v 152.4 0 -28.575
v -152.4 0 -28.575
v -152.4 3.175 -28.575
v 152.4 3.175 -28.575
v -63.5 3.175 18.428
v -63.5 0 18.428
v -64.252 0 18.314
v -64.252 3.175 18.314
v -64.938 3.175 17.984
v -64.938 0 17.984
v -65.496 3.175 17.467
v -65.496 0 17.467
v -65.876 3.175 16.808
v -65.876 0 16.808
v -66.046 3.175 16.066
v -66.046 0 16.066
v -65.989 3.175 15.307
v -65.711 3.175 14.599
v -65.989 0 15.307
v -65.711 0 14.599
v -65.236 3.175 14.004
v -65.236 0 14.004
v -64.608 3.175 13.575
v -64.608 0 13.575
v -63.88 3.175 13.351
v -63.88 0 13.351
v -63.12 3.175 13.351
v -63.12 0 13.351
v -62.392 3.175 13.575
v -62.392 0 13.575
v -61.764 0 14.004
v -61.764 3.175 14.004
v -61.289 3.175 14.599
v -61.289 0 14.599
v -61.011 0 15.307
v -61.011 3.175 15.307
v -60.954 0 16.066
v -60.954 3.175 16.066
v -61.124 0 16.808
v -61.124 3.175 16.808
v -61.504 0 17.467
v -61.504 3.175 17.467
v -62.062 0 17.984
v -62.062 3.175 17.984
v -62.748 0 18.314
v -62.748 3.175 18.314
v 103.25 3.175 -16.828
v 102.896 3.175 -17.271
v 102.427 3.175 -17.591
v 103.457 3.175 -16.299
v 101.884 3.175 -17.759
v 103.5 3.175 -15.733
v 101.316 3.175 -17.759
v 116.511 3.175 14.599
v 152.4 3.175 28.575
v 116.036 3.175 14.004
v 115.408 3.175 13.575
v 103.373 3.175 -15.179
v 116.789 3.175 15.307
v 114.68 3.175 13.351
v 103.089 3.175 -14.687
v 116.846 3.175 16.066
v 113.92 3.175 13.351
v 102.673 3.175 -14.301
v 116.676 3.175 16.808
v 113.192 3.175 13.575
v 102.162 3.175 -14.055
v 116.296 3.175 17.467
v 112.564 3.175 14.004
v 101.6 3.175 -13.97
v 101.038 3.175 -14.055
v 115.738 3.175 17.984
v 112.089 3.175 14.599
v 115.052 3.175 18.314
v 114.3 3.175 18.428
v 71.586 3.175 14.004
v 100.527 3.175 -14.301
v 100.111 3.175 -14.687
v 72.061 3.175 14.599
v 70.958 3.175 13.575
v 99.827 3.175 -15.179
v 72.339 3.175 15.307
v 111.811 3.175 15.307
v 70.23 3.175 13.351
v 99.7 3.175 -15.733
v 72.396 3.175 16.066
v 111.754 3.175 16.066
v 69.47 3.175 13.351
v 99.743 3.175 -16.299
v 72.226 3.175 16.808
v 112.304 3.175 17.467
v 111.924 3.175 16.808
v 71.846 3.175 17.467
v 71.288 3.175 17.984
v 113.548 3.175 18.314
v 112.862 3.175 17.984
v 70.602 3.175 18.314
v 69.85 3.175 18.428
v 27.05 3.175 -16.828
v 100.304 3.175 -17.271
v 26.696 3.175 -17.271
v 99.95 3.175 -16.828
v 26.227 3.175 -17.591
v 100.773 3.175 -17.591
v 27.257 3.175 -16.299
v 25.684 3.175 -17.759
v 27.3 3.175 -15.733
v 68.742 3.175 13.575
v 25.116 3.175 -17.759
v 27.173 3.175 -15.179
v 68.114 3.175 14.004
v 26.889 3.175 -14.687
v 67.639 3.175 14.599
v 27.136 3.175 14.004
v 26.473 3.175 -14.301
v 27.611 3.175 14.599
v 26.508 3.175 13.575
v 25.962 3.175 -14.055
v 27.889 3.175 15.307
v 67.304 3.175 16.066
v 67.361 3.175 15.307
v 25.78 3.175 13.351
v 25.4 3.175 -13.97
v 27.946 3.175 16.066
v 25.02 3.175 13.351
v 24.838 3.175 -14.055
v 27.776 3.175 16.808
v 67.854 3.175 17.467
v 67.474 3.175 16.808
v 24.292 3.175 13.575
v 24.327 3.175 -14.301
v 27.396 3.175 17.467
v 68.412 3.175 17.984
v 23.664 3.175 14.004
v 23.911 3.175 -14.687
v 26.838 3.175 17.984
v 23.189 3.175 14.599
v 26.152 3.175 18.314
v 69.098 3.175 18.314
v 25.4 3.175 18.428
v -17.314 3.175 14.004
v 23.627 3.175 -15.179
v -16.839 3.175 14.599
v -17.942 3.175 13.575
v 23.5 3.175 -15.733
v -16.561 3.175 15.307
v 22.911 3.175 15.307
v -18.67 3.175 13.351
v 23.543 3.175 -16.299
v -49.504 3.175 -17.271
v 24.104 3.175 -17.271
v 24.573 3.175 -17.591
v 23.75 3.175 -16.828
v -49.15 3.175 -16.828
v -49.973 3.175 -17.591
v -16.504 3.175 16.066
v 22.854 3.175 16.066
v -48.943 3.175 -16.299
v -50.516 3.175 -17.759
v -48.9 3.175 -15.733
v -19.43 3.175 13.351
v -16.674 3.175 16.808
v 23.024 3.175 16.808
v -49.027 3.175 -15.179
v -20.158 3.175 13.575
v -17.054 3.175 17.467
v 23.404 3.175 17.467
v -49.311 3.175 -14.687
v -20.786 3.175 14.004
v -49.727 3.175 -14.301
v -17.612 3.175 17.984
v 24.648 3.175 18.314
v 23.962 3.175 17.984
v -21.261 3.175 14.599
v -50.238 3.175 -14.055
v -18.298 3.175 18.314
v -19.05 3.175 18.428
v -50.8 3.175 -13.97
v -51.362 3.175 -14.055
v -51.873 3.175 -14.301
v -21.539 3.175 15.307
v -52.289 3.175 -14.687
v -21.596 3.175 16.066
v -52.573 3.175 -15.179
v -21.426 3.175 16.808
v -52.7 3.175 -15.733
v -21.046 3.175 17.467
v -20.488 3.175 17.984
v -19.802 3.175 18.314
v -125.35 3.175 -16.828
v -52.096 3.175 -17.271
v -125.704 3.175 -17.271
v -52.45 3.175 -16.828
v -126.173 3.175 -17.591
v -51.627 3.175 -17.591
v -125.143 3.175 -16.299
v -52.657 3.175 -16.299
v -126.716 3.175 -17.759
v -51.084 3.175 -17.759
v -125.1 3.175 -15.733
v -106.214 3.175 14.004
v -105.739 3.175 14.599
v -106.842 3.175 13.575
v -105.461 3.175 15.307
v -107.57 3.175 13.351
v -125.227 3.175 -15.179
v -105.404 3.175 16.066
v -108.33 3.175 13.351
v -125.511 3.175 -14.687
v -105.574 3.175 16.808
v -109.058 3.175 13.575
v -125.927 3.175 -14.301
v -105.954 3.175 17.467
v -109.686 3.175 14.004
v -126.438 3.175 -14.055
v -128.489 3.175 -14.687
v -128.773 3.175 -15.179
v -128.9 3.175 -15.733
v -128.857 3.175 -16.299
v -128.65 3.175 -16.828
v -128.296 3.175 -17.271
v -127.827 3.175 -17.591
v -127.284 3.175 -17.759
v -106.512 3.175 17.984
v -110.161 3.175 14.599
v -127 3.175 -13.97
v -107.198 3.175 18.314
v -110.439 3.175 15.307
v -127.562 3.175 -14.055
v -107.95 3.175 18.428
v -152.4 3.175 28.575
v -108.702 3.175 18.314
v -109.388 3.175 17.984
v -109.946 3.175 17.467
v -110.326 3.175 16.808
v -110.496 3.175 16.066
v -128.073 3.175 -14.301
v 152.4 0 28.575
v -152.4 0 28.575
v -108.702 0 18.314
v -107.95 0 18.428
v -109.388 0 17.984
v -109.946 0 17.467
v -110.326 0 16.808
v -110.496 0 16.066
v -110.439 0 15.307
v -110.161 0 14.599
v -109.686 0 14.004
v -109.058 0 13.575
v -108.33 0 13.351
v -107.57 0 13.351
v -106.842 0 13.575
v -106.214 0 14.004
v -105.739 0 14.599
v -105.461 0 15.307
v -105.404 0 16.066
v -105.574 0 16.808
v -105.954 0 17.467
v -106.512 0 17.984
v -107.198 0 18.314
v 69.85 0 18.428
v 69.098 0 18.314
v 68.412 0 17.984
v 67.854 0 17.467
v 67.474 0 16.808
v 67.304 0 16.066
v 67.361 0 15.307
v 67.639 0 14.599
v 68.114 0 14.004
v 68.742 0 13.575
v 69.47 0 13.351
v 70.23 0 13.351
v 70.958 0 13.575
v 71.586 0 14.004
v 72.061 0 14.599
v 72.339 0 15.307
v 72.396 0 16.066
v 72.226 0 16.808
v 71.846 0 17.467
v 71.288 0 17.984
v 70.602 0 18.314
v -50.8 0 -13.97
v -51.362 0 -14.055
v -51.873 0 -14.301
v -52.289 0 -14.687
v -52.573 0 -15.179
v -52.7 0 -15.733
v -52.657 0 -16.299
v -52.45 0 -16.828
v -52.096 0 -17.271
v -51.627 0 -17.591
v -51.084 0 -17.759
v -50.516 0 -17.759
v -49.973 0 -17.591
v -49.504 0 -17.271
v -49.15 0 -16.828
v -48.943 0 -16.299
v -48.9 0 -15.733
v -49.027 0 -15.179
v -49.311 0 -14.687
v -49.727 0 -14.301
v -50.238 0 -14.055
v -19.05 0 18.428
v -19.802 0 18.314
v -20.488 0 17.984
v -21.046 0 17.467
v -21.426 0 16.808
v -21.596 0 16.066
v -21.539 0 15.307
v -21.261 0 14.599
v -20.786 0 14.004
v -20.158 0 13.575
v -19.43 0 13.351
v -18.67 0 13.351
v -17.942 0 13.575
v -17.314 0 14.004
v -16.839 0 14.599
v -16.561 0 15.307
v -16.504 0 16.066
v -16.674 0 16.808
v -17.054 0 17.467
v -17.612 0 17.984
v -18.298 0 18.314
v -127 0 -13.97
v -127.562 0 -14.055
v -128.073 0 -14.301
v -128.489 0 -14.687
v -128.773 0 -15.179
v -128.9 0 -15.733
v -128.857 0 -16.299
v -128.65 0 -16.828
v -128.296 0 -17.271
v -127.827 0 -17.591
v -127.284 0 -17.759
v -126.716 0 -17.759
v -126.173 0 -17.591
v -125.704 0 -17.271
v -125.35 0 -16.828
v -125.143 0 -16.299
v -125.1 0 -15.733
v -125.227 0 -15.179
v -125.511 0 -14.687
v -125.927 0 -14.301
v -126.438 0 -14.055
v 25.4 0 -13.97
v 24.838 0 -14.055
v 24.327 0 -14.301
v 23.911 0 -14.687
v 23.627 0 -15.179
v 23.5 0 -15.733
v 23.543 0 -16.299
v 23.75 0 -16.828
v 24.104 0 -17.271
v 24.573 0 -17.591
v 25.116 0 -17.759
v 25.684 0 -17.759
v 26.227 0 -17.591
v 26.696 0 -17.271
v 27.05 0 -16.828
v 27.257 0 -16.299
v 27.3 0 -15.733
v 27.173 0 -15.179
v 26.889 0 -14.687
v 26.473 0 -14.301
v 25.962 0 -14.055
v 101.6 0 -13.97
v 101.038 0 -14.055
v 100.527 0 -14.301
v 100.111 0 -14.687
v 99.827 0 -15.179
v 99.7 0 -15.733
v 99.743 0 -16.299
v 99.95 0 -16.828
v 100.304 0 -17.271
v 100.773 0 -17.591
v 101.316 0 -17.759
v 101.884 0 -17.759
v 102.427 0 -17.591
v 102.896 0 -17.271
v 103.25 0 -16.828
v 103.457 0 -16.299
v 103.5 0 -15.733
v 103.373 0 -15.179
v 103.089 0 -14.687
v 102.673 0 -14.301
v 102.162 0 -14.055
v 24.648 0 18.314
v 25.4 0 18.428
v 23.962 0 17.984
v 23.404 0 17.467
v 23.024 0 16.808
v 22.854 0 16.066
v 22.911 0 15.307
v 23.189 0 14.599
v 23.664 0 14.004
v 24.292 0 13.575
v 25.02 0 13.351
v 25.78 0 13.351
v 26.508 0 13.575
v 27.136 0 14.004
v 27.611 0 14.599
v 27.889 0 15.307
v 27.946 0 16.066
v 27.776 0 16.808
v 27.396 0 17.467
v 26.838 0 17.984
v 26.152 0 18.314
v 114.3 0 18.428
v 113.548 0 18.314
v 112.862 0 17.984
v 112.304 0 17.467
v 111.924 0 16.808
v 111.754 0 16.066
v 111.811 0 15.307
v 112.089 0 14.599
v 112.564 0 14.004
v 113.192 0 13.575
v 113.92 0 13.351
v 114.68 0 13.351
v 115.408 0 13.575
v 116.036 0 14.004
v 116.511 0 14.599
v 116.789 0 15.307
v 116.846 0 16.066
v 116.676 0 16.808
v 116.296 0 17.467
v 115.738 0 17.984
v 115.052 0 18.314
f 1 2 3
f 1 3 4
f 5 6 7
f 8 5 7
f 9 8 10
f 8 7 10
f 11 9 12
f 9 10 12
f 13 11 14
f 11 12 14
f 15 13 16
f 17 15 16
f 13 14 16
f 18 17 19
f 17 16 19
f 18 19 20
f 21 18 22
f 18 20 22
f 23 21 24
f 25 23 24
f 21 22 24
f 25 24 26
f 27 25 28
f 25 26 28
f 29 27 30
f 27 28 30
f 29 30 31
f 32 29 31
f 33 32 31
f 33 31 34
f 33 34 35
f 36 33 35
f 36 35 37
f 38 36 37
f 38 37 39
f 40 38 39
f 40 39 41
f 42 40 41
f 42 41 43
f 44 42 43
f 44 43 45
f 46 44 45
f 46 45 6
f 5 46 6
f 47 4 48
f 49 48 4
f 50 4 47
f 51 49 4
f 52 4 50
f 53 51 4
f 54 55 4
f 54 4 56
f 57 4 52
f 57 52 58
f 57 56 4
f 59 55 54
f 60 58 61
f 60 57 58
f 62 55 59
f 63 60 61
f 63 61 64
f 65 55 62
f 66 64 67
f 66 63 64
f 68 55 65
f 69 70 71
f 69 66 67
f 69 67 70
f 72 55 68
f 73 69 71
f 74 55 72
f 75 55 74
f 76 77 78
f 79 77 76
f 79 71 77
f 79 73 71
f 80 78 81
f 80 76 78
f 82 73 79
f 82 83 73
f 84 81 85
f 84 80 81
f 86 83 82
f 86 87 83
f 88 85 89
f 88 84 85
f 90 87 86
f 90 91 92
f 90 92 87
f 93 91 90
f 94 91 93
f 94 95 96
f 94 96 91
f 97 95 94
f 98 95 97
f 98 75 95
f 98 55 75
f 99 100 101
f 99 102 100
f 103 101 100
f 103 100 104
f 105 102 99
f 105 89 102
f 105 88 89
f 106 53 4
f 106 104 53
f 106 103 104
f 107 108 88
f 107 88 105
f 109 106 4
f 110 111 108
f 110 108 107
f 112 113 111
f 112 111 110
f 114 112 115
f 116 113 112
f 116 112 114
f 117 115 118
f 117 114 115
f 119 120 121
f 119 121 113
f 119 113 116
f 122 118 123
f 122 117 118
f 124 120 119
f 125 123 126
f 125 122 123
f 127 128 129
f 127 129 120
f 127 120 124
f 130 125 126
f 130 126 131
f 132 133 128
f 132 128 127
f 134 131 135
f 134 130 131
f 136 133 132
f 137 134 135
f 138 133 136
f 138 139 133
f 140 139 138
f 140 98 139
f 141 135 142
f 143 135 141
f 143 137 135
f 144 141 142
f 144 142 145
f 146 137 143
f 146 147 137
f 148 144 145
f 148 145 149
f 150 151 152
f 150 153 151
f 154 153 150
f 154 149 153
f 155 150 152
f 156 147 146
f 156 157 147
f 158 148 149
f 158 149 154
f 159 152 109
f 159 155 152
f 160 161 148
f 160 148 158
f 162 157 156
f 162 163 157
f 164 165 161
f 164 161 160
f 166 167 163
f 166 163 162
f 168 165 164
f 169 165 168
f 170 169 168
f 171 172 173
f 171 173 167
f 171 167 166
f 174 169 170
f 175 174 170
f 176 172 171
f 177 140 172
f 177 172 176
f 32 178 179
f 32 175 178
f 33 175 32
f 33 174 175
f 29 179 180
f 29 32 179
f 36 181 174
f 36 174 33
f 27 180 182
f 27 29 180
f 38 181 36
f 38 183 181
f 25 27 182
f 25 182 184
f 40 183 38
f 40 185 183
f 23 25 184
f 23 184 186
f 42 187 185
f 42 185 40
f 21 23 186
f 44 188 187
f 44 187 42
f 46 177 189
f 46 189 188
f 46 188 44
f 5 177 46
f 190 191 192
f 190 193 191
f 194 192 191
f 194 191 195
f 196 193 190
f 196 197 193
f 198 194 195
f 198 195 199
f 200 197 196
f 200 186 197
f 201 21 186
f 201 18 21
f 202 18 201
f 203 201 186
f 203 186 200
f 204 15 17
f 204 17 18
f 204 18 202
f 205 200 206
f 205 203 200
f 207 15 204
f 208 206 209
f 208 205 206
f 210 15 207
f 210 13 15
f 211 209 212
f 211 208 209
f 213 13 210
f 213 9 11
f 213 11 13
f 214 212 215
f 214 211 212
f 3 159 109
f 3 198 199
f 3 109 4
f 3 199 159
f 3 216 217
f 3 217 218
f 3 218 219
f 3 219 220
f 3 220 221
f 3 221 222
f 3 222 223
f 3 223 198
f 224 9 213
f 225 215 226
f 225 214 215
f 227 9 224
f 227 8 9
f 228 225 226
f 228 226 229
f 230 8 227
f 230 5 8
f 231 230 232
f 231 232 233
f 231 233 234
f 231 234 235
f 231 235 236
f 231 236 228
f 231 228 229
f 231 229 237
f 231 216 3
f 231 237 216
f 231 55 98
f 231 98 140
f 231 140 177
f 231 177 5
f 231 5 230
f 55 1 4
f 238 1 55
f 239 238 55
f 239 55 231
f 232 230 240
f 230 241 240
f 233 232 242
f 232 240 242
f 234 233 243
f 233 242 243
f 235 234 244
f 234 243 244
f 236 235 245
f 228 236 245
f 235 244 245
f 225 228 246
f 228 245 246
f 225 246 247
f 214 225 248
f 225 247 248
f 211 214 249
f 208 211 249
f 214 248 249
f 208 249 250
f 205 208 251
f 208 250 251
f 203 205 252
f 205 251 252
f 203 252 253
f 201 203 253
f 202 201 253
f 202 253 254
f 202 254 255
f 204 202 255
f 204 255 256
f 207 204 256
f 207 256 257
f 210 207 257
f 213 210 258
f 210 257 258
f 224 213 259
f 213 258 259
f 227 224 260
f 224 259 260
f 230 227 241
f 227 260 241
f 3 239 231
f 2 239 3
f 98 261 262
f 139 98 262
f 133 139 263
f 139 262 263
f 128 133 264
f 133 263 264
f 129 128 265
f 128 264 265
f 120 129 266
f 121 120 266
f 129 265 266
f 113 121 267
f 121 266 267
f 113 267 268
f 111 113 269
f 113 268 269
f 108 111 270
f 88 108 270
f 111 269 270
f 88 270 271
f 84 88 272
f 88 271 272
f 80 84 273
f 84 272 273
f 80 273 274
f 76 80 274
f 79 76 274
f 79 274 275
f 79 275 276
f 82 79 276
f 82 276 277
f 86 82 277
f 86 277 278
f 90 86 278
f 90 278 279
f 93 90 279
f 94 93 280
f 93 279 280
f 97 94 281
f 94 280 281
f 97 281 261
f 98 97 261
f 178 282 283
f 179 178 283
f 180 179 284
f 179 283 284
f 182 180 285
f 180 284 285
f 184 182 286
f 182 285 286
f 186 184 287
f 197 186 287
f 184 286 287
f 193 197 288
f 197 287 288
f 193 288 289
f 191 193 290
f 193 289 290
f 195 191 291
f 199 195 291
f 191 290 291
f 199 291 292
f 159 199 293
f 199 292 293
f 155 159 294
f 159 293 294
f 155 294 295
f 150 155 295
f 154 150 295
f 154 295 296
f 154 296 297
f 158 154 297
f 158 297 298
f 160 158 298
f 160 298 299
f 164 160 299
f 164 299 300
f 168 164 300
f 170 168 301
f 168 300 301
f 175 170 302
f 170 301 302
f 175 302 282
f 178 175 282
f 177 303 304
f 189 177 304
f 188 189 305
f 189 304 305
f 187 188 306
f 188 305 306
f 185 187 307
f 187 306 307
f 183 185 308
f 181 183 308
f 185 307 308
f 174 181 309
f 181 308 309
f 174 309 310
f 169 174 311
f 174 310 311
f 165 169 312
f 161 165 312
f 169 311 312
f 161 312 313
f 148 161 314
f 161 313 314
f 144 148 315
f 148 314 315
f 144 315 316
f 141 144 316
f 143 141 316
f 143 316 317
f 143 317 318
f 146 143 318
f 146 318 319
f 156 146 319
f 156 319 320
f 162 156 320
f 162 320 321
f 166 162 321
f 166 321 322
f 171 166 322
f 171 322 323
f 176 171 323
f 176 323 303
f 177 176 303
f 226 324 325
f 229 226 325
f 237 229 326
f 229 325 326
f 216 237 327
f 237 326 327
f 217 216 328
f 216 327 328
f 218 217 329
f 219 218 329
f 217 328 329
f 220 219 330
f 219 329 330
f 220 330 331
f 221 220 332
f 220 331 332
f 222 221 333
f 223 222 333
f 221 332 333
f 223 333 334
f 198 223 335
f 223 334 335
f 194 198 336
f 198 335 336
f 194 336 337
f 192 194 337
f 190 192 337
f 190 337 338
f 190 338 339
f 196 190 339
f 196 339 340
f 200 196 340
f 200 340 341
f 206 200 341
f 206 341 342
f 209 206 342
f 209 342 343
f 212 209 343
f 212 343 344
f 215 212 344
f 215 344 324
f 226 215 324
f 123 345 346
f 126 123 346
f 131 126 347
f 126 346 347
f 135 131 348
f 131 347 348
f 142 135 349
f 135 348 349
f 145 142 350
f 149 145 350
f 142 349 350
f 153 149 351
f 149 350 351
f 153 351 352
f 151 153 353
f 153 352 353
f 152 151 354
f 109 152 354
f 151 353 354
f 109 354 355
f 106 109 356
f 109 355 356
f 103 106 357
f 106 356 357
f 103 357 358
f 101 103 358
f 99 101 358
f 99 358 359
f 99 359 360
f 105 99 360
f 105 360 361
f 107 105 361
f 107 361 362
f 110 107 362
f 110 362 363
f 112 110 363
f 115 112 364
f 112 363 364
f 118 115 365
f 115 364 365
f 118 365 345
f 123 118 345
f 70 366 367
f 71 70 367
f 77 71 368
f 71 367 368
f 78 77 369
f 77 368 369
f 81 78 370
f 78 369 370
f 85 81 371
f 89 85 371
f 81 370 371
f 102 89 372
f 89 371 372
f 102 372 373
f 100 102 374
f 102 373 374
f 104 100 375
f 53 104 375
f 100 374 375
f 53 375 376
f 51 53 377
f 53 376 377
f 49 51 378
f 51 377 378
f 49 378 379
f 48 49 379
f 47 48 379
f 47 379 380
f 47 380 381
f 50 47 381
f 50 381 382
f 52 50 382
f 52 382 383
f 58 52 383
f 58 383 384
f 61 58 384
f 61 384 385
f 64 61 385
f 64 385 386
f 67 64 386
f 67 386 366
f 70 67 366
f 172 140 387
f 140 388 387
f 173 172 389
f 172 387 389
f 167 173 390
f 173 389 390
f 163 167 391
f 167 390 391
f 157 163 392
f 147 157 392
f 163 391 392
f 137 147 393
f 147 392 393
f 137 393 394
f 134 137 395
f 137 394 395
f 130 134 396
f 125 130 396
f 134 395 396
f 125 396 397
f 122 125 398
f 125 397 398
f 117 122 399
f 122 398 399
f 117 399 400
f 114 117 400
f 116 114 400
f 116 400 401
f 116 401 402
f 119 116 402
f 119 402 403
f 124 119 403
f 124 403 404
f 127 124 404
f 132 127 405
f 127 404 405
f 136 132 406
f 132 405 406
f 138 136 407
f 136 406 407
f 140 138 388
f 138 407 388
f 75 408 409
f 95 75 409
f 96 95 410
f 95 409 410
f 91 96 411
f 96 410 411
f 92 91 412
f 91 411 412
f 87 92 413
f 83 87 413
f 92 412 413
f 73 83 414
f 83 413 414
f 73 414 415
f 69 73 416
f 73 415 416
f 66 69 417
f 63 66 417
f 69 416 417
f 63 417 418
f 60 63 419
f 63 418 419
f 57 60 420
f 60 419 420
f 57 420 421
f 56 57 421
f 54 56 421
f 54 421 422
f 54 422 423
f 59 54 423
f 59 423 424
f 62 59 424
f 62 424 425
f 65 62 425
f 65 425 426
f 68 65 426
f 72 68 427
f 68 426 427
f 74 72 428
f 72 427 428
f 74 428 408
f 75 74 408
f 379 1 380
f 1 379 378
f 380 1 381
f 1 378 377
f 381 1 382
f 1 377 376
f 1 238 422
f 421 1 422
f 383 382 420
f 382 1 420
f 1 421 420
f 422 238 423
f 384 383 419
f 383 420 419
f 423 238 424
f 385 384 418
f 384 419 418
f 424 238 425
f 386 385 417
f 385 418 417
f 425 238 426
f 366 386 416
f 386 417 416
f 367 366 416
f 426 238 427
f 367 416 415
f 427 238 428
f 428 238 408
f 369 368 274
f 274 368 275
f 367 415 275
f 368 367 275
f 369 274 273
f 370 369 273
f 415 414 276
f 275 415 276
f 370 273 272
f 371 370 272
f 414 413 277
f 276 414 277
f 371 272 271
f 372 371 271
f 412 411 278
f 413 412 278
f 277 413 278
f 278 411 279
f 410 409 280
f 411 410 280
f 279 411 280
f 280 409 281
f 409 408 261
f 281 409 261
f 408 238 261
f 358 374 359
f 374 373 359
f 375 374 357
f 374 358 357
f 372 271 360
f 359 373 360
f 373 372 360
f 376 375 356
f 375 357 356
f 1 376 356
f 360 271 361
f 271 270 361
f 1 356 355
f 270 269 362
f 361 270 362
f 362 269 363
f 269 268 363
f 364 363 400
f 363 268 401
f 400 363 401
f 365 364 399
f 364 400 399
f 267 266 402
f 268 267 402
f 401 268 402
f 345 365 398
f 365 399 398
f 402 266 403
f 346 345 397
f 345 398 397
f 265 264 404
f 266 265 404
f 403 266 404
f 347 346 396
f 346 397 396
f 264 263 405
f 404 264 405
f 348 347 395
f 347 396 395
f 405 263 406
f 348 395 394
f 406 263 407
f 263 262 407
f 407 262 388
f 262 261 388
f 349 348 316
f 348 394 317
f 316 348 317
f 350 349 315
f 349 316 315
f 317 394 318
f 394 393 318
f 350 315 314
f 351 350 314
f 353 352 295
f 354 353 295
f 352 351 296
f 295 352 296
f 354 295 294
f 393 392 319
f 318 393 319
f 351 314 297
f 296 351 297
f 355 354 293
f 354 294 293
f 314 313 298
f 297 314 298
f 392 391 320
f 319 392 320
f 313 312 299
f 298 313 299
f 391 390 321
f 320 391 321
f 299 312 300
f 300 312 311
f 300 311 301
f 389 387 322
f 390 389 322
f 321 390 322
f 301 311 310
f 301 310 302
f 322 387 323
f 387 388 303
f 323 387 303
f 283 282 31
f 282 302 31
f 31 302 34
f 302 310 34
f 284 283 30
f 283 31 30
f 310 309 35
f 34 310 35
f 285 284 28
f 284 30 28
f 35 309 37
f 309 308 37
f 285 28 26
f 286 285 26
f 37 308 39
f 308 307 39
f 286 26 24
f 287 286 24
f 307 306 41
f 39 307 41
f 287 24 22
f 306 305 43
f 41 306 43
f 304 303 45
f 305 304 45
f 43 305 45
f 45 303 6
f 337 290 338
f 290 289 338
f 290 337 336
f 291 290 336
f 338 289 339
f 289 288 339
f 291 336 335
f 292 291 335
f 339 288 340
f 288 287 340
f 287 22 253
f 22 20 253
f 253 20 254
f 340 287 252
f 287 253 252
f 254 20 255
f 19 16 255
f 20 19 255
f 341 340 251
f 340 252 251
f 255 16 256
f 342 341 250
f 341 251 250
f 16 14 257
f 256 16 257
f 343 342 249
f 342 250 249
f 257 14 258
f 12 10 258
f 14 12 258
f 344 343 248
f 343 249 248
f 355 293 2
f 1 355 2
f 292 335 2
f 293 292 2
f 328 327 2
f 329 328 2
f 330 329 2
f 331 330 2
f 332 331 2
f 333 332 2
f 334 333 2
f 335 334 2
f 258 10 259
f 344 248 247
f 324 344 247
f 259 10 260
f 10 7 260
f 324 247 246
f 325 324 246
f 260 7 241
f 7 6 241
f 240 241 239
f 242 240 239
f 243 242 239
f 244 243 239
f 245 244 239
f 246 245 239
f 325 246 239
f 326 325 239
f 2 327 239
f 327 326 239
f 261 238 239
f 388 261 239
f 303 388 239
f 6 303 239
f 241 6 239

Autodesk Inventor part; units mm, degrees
ref_plane "YZ Plane" through (0, 0, 0) normal (1, 0, 0) x (0, 1, 0)
ref_plane "XZ Plane" through (0, 0, 0) normal (0, 1, 0) x (-1, 0, 0)
ref_plane "XY Plane" through (0, 0, 0) normal (0, 0, 1) x (1, 0, 0)
sketch "Sketch1" plane through (0, 0, 0) normal (0, 1, 0) x (-1, 0, 0)
  line L0 (-152.4, 28.575) -> (152.4, 28.575)
  line L1 (152.4, 28.575) -> (152.4, -28.575)
  line L2 (152.4, -28.575) -> (-152.4, -28.575)
  line L3 (-152.4, -28.575) -> (-152.4, 28.575)
  line L4 (-152.4, 28.575) -> (152.4, -28.575) construction
  line L5 (152.4, 28.575) -> (-152.4, -28.575) construction
  point P0 (0, 0)
  dimension "d0" = 304.8
  dimension "d1" = 57.15
extrude "Extrusion1" add sketch "Sketch1" along normal blind 3.175
sketch "Sketch2" plane through (0, 3.175, 0) normal (0, 1, 0) x (1, 0, 0)
  line L0 (152.4, 28.575) -> (-152.4, 28.575) projected
  line L1 (-152.4, -28.575) -> (152.4, -28.575) projected
  line L2 (0, -15.875) -> (-152.4, -15.875)
  line L3 (-152.4, 28.575) -> (-152.4, -28.575) projected
  line L4 (0, -15.875) -> (152.4, -15.875)
  line L5 (0, 15.875) -> (-152.4, 15.875)
  line L6 (0, 15.875) -> (152.4, 15.875)
  line L7 (152.4, -28.575) -> (152.4, 28.575) projected
  line L8 (-152.4, -15.875) -> (-107.95, -15.875)
  line L9 (-107.95, -15.875) -> (-63.5, -15.875)
  line L10 (-63.5, -15.875) -> (-19.05, -15.875)
  line L11 (-19.05, -15.875) -> (25.4, -15.875)
  line L12 (25.4, -15.875) -> (69.85, -15.875)
  line L13 (69.85, -15.875) -> (114.3, -15.875)
  line L14 (-152.4, 15.875) -> (-127, 15.875)
  line L15 (-127, 15.875) -> (-50.8, 15.875)
  line L16 (-50.8, 15.875) -> (25.4, 15.875)
  line L17 (25.4, 15.875) -> (101.6, 15.875)
  point P0 (0, 0)
  dimension "d8" = 44.45
  dimension "d9" = 44.45
  dimension "d10" = 44.45
  dimension "d11" = 44.45
  dimension "d12" = 44.45
  dimension "d13" = 44.45
  dimension "d14" = 25.4
  dimension "d15" = 76.2
  dimension "d16" = 76.2
  dimension "d17" = 76.2
hole "Hole1" at (-107.95, 3.175, 15.875) at (-63.5, 3.175, 15.875) at (-19.05, 3.175, 15.875) at (25.4, 3.175, 15.875) at (69.85, 3.175, 15.875) at (114.3, 3.175, 15.875) direction (0, -1, 0) diameter 5.1054 end through all clearance for "Flat Head Machine Screw (82)" size "#10" standard "Ansi Unified Screw Threads"
sketch "Sketch3" plane through (0, 3.175, 0) normal (0, 1, 0) x (1, 0, 0)
  line L0 (152.4, 28.575) -> (-152.4, 28.575)
  line L1 (-152.4, -28.575) -> (152.4, -28.575)
  line L2 (0, -15.875) -> (-152.4, -15.875)
  line L3 (-152.4, 28.575) -> (-152.4, -28.575)
  line L4 (0, -15.875) -> (152.4, -15.875)
  line L5 (0, 15.875) -> (-152.4, 15.875)
  line L6 (0, 15.875) -> (152.4, 15.875)
  line L7 (152.4, -28.575) -> (152.4, 28.575)
  line L8 (-152.4, -15.875) -> (-107.95, -15.875)
  line L9 (-107.95, -15.875) -> (-63.5, -15.875)
  line L10 (-63.5, -15.875) -> (-19.05, -15.875)
  line L11 (-19.05, -15.875) -> (25.4, -15.875)
  line L12 (25.4, -15.875) -> (69.85, -15.875)
  line L13 (69.85, -15.875) -> (114.3, -15.875)
  line L14 (-152.4, 15.875) -> (-127, 15.875)
  line L15 (-127, 15.875) -> (-50.8, 15.875)
  line L16 (-50.8, 15.875) -> (25.4, 15.875)
  line L17 (25.4, 15.875) -> (101.6, 15.875)
  point P0 (0, 0)
  point P1 (0, 0)
  dimension "d25" = 44.45
  dimension "d26" = 44.45
  dimension "d27" = 44.45
  dimension "d28" = 44.45
  dimension "d29" = 44.45
  dimension "d30" = 44.45
  dimension "d31" = 25.4
  dimension "d32" = 76.2
  dimension "d33" = 76.2
  dimension "d34" = 76.2
hole "Hole2" at (-127, 3.175, -15.875) at (-50.8, 3.175, -15.875) at (25.4, 3.175, -15.875) at (101.6, 3.175, -15.875) direction (0, -1, 0) diameter 3.81 end through all clearance for "Flat Head Machine Screw (82)" size "#6" standard "Ansi Unified Screw Threads"
properties part number "Rack-Elondo-Bracket"
